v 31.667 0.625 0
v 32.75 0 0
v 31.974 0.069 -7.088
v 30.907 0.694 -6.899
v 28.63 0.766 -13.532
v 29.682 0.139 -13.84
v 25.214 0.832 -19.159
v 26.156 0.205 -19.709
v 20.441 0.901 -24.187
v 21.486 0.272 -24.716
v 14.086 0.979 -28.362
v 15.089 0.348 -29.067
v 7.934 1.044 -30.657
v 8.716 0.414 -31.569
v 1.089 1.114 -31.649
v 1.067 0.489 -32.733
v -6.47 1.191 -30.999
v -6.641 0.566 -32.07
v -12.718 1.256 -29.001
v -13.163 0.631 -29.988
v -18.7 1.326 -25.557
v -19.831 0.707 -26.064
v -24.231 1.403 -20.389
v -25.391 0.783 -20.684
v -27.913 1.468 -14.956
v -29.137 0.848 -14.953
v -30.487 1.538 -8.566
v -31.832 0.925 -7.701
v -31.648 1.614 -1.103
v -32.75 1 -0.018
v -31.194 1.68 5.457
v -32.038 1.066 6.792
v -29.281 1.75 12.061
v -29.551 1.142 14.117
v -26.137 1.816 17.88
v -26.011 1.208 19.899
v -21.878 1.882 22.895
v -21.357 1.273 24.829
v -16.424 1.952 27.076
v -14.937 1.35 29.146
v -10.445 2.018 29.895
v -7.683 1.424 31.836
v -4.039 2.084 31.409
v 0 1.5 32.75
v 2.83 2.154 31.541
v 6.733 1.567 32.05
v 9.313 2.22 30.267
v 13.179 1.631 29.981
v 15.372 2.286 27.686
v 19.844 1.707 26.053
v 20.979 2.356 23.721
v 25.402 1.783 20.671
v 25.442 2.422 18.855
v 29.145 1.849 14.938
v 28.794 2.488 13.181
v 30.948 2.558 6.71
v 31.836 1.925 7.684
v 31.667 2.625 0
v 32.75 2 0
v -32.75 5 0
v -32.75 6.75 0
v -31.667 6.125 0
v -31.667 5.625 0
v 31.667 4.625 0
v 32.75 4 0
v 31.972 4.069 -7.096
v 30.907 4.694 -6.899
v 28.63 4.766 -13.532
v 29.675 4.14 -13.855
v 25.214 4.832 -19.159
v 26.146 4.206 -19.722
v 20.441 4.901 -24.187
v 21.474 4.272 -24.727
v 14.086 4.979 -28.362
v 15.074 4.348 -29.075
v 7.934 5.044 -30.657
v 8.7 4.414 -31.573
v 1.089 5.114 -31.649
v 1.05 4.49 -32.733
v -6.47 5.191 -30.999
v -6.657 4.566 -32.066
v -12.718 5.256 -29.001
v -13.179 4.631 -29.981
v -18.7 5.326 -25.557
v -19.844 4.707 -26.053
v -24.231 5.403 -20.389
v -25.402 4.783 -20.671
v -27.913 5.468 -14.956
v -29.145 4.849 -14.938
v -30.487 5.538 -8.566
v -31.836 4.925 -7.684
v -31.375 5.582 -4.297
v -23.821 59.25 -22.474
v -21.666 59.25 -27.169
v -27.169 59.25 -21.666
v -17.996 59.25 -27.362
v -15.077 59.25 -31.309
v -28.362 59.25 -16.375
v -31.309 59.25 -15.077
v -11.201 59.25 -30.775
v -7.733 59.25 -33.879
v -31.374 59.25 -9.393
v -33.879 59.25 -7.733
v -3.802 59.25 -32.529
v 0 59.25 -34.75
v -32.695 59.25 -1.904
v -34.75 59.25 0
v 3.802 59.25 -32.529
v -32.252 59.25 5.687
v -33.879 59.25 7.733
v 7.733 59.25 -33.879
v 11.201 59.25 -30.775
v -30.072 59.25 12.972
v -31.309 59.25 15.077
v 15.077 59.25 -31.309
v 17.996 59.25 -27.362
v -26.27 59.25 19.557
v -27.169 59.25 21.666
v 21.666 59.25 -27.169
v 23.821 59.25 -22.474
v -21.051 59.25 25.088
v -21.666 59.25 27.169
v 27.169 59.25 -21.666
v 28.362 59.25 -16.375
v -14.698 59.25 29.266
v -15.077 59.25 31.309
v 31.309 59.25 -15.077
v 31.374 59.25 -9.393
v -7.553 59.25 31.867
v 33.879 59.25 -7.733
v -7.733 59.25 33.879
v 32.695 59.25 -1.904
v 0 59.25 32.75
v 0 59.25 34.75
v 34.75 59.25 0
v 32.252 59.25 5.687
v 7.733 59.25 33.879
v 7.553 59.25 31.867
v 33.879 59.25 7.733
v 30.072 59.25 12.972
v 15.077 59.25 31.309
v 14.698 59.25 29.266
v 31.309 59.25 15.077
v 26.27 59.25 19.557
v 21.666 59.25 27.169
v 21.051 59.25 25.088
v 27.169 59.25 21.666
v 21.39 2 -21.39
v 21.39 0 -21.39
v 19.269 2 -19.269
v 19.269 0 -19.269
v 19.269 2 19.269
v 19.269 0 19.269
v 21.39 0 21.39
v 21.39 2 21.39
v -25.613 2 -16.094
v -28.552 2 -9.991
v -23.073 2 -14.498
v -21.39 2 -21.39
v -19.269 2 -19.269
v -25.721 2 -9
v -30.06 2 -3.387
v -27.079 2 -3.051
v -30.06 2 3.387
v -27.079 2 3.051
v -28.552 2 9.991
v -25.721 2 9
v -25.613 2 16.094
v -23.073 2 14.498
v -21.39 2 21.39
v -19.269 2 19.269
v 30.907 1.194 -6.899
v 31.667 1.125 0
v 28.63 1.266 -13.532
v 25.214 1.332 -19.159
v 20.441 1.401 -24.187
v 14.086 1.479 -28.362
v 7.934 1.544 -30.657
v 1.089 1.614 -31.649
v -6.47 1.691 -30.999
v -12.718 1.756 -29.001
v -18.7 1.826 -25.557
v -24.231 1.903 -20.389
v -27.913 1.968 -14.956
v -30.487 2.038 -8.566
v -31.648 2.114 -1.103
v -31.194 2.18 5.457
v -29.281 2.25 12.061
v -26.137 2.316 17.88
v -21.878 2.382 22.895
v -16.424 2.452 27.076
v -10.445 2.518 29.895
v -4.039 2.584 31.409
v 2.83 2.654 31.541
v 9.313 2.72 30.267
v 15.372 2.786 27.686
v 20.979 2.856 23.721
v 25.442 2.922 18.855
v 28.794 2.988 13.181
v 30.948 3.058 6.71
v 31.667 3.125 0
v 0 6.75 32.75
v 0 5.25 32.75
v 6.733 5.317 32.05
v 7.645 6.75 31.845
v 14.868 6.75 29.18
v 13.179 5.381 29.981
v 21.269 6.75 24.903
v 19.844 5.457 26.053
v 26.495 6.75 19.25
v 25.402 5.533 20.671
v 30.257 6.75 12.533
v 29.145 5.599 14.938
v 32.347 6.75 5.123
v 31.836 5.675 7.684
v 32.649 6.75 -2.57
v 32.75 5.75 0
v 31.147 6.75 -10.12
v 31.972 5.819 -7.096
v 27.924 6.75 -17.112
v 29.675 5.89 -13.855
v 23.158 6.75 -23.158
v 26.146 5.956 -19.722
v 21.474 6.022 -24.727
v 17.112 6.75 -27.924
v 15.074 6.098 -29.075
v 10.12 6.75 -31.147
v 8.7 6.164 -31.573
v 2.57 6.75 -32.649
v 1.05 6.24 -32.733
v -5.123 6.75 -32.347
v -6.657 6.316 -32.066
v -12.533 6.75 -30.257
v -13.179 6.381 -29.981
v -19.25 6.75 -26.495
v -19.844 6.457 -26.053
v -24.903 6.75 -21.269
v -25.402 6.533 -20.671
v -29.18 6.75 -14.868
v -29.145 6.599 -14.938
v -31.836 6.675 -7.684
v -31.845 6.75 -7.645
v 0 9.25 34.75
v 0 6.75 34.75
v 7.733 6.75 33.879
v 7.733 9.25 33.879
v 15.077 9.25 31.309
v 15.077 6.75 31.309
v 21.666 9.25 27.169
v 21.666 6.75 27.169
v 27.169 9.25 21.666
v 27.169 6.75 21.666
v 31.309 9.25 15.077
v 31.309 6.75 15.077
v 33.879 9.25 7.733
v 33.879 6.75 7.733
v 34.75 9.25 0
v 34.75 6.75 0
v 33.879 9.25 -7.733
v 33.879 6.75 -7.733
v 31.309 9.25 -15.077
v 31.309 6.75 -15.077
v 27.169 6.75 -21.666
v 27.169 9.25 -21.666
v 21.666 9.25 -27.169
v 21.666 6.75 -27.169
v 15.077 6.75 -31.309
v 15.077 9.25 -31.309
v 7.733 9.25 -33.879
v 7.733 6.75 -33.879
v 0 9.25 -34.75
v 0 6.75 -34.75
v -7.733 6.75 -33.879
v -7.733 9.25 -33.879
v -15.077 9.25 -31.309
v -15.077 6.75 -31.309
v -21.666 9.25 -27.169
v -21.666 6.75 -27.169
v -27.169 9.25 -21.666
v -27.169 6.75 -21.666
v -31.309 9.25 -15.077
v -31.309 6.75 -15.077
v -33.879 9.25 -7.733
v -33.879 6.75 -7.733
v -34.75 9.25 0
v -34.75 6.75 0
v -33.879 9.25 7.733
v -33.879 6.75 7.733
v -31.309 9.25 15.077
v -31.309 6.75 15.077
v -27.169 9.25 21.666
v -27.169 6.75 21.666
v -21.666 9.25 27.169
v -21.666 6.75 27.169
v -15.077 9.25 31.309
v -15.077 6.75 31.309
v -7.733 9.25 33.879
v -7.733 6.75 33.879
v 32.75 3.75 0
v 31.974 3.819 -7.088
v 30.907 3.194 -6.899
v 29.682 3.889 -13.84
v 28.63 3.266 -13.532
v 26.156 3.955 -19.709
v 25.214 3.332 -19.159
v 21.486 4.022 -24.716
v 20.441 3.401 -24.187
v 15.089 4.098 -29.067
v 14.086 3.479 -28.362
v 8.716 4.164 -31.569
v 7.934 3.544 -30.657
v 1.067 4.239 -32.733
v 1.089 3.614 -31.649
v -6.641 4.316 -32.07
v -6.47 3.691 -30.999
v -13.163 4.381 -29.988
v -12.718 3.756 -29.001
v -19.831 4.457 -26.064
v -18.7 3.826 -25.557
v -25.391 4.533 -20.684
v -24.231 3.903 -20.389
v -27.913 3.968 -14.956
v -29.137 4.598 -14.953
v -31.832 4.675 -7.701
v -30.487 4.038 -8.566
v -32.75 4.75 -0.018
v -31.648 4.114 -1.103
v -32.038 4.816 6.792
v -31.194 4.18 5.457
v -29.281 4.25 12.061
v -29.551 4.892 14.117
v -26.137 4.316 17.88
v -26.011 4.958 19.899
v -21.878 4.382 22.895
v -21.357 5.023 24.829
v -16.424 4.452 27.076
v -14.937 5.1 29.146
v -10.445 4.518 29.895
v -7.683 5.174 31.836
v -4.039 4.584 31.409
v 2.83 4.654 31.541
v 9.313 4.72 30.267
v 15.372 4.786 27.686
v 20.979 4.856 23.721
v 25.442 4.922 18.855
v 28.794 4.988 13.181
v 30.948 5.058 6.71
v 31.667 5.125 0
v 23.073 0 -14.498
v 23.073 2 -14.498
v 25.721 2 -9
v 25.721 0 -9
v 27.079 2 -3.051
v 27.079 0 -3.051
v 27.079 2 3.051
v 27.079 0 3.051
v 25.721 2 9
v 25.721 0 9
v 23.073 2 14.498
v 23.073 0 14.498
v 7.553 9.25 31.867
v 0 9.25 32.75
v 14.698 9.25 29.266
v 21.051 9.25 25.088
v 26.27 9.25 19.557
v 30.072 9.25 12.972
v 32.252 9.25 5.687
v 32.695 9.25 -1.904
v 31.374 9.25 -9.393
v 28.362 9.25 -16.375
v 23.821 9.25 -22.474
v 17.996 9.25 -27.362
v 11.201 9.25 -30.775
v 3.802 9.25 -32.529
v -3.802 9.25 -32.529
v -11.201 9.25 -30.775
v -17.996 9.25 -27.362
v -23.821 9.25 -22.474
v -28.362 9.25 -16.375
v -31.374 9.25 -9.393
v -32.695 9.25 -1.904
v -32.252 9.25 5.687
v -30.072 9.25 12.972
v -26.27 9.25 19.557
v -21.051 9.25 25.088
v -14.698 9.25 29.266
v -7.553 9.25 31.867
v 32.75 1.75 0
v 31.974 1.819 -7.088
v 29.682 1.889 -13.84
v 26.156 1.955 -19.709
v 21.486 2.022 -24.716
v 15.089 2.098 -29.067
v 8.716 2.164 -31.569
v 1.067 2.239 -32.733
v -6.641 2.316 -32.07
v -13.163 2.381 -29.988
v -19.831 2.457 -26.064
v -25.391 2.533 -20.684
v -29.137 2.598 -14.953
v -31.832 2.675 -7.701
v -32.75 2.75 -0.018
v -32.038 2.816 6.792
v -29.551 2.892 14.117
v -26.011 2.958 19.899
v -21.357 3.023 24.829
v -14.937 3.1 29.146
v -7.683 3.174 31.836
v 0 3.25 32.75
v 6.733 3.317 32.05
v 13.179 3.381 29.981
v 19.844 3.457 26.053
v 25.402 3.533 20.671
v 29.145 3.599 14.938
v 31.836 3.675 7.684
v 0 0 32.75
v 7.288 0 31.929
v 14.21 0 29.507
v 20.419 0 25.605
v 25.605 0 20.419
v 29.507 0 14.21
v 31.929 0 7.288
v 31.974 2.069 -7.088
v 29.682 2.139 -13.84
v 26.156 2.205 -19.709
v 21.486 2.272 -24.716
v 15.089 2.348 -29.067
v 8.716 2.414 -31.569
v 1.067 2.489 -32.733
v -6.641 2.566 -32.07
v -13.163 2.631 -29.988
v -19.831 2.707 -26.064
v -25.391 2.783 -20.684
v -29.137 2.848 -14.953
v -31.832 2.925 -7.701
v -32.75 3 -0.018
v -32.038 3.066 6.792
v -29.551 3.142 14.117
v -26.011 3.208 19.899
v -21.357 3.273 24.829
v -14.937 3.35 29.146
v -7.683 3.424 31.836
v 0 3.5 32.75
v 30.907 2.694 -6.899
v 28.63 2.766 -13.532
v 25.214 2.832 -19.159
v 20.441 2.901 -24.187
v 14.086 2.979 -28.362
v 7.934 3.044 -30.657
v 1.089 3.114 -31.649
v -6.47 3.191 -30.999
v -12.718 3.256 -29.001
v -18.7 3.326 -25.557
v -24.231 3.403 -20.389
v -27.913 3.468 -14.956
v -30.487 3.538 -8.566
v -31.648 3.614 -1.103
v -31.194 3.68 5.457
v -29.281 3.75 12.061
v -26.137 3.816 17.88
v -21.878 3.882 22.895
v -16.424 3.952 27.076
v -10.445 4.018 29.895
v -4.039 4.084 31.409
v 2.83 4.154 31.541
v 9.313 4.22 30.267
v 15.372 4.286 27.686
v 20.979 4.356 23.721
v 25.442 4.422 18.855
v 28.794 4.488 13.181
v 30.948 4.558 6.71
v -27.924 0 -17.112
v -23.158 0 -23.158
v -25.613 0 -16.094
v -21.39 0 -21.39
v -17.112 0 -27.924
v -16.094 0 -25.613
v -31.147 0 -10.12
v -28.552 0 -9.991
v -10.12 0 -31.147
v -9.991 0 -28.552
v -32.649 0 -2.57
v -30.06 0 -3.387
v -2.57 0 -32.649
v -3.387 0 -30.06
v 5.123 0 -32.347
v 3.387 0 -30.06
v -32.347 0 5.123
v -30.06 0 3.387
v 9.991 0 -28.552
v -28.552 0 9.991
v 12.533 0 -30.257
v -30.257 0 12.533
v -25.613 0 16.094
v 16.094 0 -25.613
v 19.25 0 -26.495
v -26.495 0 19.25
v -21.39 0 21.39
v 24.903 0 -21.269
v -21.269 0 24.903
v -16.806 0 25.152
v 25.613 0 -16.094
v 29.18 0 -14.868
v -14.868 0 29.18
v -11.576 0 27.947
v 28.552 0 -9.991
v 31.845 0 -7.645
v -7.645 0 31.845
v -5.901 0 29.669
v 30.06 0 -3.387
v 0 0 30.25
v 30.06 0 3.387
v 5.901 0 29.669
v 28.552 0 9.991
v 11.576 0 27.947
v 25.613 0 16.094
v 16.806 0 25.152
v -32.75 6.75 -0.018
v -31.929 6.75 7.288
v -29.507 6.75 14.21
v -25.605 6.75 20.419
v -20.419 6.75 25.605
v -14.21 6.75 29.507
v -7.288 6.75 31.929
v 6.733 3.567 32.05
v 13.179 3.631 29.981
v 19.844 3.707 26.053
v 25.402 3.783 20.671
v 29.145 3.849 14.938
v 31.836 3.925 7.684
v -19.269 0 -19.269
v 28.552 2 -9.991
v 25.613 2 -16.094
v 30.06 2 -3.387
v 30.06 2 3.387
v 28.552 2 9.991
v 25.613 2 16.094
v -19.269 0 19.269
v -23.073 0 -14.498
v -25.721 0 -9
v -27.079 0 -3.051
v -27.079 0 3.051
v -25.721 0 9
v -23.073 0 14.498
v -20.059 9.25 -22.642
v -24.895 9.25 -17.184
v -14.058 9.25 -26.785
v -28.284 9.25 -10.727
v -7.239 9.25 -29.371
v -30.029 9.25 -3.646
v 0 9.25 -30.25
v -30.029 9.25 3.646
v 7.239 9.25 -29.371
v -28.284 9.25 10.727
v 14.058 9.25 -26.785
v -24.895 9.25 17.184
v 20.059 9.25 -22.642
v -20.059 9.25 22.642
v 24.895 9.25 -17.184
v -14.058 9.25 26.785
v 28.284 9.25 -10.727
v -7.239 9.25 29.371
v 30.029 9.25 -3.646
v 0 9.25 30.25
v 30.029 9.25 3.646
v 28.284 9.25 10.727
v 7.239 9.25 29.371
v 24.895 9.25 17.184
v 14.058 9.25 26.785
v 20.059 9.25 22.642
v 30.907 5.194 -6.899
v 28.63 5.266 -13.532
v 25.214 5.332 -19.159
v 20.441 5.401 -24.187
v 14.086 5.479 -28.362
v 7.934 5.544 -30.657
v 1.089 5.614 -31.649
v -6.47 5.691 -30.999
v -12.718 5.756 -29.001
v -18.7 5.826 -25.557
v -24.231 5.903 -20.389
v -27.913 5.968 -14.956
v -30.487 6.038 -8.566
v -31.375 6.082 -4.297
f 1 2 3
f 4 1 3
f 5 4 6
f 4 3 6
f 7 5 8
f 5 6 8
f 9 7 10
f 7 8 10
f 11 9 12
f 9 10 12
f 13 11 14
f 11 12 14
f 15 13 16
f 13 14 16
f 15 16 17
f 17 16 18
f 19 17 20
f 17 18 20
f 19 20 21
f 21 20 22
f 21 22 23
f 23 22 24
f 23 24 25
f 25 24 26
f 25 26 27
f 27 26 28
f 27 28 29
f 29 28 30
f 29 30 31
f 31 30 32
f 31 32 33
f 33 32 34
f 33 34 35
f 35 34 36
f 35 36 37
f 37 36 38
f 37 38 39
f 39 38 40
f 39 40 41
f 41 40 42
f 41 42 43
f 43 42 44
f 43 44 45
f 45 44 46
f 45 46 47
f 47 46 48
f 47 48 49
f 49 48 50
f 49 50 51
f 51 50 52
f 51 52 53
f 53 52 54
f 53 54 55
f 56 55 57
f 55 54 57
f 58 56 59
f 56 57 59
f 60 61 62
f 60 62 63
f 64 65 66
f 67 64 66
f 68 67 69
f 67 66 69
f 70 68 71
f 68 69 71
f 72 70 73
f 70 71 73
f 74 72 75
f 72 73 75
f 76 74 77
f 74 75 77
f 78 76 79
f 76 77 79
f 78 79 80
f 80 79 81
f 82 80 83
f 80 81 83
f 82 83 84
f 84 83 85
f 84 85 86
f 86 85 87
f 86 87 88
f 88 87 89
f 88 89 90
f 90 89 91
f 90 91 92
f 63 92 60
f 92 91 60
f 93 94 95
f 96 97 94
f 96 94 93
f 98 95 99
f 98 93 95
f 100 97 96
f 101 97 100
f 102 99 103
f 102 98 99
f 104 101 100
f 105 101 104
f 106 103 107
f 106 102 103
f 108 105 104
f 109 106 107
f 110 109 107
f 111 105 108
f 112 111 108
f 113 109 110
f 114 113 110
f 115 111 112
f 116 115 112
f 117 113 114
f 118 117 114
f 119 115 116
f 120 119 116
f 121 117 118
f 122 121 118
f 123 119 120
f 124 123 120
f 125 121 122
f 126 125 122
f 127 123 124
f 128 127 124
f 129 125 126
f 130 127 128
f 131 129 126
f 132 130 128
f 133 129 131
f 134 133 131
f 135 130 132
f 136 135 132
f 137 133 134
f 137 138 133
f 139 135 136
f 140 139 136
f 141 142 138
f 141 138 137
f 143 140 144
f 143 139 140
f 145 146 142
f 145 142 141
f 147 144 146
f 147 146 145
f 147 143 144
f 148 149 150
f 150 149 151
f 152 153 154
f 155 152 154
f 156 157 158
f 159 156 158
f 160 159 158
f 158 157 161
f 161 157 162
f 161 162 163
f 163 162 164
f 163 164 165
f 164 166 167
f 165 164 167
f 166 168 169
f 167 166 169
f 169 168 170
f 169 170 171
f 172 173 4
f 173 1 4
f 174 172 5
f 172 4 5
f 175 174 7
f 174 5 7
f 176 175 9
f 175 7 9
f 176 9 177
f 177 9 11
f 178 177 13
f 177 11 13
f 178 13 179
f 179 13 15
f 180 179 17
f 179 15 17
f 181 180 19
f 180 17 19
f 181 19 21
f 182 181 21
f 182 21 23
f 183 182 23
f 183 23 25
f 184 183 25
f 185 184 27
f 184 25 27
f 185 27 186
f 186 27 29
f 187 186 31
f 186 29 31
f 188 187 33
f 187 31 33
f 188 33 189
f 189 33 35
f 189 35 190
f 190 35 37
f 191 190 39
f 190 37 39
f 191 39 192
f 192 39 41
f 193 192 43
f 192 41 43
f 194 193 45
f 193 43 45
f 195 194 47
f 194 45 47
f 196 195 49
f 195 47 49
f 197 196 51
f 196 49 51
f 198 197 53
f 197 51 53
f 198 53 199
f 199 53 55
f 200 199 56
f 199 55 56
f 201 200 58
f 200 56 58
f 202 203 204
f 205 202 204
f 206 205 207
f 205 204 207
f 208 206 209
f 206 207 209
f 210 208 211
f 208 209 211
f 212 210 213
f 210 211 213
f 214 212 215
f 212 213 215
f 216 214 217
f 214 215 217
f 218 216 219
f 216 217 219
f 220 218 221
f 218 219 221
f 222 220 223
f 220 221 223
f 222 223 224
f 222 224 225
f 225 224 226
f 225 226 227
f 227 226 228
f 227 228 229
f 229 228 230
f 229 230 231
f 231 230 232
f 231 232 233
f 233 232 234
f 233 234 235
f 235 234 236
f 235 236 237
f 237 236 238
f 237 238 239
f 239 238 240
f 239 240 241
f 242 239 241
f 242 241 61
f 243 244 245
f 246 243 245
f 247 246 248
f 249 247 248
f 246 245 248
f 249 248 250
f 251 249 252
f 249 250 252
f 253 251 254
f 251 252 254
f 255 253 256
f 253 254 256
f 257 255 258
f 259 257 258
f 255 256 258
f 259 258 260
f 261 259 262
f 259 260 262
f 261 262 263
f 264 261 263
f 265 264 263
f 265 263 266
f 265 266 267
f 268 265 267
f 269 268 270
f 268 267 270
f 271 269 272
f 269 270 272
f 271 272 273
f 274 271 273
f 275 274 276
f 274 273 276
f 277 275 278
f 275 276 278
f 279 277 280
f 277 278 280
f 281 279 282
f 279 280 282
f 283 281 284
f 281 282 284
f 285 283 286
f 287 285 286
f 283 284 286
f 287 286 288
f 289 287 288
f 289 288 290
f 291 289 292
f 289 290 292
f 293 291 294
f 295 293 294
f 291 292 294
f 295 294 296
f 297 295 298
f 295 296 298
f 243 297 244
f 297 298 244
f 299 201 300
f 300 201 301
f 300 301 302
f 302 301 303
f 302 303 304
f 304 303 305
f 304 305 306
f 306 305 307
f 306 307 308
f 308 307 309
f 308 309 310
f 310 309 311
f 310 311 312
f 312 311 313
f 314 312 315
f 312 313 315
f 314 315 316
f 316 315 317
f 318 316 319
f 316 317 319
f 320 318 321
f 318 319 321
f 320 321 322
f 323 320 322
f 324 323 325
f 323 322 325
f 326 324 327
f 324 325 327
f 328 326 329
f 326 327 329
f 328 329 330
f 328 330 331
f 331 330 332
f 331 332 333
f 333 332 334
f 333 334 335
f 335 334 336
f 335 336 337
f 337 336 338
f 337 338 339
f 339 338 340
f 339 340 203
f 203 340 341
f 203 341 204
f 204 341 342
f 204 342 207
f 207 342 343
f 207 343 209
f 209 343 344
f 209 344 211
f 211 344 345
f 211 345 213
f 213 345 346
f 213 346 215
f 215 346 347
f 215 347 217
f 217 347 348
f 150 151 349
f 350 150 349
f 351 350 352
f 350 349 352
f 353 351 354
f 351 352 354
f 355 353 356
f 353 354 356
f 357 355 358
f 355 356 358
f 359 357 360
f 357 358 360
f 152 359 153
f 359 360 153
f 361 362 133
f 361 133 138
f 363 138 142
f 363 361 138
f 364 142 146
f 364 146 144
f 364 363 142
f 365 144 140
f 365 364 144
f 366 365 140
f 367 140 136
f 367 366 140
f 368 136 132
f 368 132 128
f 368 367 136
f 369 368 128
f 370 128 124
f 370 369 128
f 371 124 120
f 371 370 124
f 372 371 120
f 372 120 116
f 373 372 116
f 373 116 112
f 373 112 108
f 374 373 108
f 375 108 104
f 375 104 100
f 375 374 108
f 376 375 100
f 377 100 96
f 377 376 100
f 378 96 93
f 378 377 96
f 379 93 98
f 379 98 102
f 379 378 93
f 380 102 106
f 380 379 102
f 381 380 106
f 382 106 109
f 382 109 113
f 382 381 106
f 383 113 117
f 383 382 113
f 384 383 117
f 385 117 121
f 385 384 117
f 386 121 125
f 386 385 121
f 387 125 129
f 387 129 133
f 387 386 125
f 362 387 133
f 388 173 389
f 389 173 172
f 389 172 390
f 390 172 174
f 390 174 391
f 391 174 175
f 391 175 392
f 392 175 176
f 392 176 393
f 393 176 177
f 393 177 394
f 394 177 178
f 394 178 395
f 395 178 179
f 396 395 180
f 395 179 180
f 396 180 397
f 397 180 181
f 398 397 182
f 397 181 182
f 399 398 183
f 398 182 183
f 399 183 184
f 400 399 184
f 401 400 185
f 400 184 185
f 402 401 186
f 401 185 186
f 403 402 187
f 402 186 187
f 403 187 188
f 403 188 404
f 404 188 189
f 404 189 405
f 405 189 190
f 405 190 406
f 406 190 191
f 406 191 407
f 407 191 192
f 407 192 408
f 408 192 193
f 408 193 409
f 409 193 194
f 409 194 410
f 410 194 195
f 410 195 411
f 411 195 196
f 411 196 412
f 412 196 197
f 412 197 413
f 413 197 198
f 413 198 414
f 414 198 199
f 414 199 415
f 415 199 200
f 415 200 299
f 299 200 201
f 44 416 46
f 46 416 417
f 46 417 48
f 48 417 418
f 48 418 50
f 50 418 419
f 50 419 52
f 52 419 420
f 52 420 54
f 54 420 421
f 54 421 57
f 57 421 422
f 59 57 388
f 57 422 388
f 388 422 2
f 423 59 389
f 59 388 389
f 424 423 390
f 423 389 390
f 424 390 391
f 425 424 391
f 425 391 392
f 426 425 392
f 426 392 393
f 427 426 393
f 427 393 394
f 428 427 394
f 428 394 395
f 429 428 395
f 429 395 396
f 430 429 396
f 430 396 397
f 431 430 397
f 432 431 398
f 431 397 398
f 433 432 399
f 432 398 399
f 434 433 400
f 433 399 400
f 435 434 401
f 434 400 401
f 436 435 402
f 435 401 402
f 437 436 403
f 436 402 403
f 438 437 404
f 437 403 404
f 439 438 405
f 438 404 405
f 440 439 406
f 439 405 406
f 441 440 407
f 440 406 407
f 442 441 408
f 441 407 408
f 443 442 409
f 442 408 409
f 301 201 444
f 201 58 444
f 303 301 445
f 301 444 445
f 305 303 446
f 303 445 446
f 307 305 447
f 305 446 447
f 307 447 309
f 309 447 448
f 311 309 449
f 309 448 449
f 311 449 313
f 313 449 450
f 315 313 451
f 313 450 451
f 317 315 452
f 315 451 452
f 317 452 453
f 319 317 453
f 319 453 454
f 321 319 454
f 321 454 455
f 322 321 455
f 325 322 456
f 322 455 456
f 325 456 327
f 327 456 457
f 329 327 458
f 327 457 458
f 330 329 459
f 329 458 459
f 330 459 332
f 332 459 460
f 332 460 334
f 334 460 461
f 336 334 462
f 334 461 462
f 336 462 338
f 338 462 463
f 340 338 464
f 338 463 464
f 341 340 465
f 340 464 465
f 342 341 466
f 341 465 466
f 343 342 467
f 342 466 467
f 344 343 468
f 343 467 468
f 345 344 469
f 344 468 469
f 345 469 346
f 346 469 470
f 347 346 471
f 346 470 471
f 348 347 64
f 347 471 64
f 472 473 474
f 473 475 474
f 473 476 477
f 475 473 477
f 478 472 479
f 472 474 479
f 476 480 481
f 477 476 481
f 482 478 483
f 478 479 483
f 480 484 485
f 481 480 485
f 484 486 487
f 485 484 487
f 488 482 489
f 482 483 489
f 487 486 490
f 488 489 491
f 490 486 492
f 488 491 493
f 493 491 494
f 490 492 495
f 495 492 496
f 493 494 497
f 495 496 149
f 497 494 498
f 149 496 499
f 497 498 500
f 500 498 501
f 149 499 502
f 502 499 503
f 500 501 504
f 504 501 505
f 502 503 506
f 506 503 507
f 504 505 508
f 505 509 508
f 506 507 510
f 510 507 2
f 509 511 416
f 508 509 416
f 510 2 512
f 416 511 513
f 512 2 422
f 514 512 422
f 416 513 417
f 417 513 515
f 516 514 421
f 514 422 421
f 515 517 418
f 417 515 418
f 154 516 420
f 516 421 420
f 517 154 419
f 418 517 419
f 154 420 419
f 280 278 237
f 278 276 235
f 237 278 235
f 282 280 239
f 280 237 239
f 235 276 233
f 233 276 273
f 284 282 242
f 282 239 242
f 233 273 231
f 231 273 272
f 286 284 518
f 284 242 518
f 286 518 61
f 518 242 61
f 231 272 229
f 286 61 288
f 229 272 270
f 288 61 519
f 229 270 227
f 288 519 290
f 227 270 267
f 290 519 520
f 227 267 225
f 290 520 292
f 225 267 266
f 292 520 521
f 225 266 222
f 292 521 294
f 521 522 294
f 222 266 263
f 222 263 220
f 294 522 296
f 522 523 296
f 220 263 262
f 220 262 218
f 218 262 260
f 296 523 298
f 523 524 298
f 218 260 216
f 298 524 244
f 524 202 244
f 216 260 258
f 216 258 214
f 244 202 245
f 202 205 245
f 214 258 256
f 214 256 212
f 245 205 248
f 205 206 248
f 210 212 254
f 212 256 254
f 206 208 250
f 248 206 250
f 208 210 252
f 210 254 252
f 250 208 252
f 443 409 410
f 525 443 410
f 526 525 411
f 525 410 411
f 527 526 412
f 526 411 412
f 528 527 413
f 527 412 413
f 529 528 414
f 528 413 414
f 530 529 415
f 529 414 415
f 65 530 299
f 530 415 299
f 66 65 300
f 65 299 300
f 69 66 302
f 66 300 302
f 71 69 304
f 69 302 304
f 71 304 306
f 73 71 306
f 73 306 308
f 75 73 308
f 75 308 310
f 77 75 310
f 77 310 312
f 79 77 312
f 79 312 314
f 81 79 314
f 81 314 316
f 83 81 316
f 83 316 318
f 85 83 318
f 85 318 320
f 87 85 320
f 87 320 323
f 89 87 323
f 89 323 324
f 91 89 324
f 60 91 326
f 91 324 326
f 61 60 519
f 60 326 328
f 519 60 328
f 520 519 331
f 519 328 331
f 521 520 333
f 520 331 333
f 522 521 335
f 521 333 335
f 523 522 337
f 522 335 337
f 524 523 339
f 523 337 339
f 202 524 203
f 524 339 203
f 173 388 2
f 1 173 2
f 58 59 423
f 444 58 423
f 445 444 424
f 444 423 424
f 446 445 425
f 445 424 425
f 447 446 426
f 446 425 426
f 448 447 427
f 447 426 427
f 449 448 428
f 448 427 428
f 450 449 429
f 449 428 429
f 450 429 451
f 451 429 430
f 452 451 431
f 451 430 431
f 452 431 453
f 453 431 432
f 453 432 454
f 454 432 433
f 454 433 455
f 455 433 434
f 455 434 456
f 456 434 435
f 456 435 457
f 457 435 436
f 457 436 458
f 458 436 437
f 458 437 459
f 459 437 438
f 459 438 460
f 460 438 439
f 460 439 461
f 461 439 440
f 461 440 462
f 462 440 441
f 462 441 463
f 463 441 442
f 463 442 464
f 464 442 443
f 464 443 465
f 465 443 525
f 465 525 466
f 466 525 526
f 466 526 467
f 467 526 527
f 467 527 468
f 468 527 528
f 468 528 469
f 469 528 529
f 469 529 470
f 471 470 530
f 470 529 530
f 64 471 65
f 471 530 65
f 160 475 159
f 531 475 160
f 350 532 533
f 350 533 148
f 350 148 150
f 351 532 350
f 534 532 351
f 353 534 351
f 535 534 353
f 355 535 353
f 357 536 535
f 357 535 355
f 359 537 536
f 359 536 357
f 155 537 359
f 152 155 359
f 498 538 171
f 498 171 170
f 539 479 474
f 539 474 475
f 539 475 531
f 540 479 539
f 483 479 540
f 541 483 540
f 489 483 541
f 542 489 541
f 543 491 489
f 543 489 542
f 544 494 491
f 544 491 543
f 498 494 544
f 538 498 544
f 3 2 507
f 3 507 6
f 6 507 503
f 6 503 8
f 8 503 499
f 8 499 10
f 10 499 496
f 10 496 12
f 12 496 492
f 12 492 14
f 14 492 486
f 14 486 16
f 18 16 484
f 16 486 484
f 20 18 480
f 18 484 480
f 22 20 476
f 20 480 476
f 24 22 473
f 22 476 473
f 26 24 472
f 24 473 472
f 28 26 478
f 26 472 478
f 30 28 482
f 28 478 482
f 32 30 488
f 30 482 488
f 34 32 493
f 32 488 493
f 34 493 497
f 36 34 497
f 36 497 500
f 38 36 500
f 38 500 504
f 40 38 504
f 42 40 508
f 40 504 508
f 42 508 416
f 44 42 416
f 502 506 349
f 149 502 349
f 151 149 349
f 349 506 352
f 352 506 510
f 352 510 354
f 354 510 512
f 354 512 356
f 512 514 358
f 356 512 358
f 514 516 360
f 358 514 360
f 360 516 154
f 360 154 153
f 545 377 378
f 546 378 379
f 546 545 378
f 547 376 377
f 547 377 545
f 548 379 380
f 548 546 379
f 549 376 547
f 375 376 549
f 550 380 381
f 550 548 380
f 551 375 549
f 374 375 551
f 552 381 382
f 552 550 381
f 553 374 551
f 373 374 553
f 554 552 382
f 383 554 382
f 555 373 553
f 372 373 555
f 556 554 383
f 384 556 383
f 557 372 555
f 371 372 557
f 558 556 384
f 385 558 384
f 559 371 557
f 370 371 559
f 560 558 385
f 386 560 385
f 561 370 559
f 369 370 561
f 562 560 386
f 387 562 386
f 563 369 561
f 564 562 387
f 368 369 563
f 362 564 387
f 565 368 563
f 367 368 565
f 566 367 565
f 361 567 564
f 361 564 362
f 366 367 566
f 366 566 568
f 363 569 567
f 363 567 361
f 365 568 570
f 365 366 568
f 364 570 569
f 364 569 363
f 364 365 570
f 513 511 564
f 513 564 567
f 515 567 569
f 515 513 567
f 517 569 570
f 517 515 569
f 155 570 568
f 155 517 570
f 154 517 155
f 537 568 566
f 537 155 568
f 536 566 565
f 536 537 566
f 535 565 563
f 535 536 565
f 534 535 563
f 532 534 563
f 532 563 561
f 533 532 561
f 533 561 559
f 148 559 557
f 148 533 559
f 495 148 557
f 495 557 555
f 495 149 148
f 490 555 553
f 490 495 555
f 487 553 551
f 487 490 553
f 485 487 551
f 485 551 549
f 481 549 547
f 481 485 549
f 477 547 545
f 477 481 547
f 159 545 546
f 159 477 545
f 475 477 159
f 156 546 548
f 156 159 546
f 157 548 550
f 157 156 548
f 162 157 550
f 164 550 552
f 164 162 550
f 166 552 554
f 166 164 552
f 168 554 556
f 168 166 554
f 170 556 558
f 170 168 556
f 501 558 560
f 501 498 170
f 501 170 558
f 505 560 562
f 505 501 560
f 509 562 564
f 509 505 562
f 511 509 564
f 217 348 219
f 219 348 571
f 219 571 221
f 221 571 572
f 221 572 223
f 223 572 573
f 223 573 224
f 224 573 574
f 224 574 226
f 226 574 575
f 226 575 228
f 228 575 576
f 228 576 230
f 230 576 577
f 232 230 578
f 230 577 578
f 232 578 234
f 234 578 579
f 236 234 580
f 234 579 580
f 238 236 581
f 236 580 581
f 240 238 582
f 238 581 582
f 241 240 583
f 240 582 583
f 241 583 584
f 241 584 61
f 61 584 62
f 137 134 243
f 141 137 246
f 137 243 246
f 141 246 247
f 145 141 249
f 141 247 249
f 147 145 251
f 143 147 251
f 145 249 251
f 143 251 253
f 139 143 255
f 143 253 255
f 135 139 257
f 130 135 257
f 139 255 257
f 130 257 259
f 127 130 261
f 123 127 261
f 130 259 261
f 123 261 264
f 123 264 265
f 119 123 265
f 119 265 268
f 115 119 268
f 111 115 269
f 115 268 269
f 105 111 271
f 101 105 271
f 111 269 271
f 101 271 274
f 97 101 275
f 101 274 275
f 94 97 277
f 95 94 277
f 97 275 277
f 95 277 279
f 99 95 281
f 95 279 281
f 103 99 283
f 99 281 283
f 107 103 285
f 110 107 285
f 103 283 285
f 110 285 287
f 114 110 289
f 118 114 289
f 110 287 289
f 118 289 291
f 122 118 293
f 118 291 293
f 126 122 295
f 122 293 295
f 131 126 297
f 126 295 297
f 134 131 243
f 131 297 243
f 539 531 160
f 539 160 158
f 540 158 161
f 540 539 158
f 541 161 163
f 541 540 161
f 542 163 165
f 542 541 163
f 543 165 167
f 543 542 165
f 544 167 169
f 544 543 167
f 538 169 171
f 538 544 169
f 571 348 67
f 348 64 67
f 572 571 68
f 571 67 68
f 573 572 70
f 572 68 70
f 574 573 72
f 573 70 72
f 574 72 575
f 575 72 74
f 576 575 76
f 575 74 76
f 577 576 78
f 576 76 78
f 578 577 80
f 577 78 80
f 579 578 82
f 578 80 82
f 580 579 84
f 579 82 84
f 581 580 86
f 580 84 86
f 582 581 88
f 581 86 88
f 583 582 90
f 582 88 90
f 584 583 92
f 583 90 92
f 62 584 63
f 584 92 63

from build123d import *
from build123d.topology import SkipClean

# Parameters (mm, degrees)
SKETCH1_R           = 32.75
SKETCH1_R_2         = 30.25
BOSS_EXTRUDE1_DEPTH = 6.75
SKETCH2_R           = 34.75
SKETCH2_R_2         = 30.25
BOSS_EXTRUDE2_DEPTH = 2.5
THREAD1_PITCH       = 2
BOSS_EXTRUDE3_DEPTH = 2
SKETCH5_R           = 34.75
SKETCH5_R_2         = 32.75
BOSS_EXTRUDE4_DEPTH = 50


with BuildPart() as part:
    # Sketch1 → Boss-Extrude1 (new body)
    with BuildSketch(Plane(origin=(0, 0, 0), x_dir=(1, 0, 0), z_dir=(0, 1, 0))):
        with Locations(Location((0, 0, 0), (0, 0, 270))):
            Circle(SKETCH1_R)
        with Locations(Location((0, 0, 0), (0, 0, 270))):
            Circle(SKETCH1_R_2, mode=Mode.SUBTRACT)
    extrude(amount=BOSS_EXTRUDE1_DEPTH)

    # Sketch2 → Boss-Extrude2 (add)
    with BuildSketch(Plane(origin=(0, 6.75, 0), x_dir=(1, 0, 0), z_dir=(0, 1, 0))):
        with Locations(Location((0, 0, 0), (0, 0, 270))):
            Circle(SKETCH2_R)
        with Locations(Location((0, 0, 0), (0, 0, 270))):
            Circle(SKETCH2_R_2, mode=Mode.SUBTRACT)
    extrude(amount=BOSS_EXTRUDE2_DEPTH)

    # Thread1: the profile of Thread Profile1 profile screwed along a right-hand helix of 2.5 turns, 10 arcs to a turn; built about Z, then put on its axis
    with SkipClean():  # the faces are left unmerged after this step: merging them gives an invalid solid
        thread1_z = Axis((0, 0, 0), (0, 0, 1))
        thread1_corners = [(32.7503, 0, -0.000173205), (32.7503, 0, 1.7501732), (31.66746825, 0, 1.124999997), (31.66746825, 0, 0.624999997)]
        with BuildLine(mode=Mode.PRIVATE) as thread1_profile:
            Line(thread1_corners[0], thread1_corners[1])
            Line(thread1_corners[1], thread1_corners[2])
            Line(thread1_corners[2], thread1_corners[3])
            Line(thread1_corners[3], thread1_corners[0])
        thread1_cap = Face(thread1_profile.wire())
        thread1_turn_angles = [0, 18, 36, 54, 72, 90, 108, 126, 144, 162, 180, 198, 216, 234, 252, 270, 288, 306, 324, 342, 360]
        thread1_turn_weights = [1, 0.9510565162951535, 1, 0.9510565162951535, 1, 0.9510565162951535, 1, 0.9510565162951535, 1, 0.9510565162951535, 1, 0.9510565162951535, 1, 0.9510565162951535, 1, 0.9510565162951535, 1, 0.9510565162951535, 1, 0.9510565162951535, 1]
        thread1_turn_rails = [Edge.make_bspline([Vector(p[0], p[1], 0).rotate(thread1_z, thread1_turn_angles[k]) / thread1_turn_weights[k] + Vector(0, 0, p[2] + THREAD1_PITCH * thread1_turn_angles[k] / 360) for k in range(21)], [0, 0, 0, 1, 1, 2, 2, 3, 3, 4, 4, 5, 5, 6, 6, 7, 7, 8, 8, 9, 9, 10, 10, 10], 2, thread1_turn_weights) for p in thread1_corners]
        thread1_turn_sides = [Face.make_surface_from_curves(thread1_turn_rails[p[0]], thread1_turn_rails[p[1]]) for p in [(0, 1), (1, 2), (2, 3), (3, 0)]]
        thread1_last_angles = [720, 738, 756, 774, 792, 810, 828, 846, 864, 882, 900]
        thread1_last_weights = [1, 0.9510565162951535, 1, 0.9510565162951535, 1, 0.9510565162951535, 1, 0.9510565162951535, 1, 0.9510565162951535, 1]
        thread1_last_rails = [Edge.make_bspline([Vector(p[0], p[1], 0).rotate(thread1_z, thread1_last_angles[k]) / thread1_last_weights[k] + Vector(0, 0, p[2] + THREAD1_PITCH * thread1_last_angles[k] / 360) for k in range(11)], [0, 0, 0, 1, 1, 2, 2, 3, 3, 4, 4, 5, 5, 5], 2, thread1_last_weights) for p in thread1_corners]
        thread1_last_sides = [Face.make_surface_from_curves(thread1_last_rails[p[0]], thread1_last_rails[p[1]]) for p in [(0, 1), (1, 2), (2, 3), (3, 0)]]
        thread1 = Plane(origin=(0, 0, 0), x_dir=(1, 0, 0), z_dir=(0, 1, 0)) * Solid(Shell([*[p.moved(Location((0, 0, THREAD1_PITCH * i))) for i in range(2) for p in thread1_turn_sides], *thread1_last_sides, thread1_cap, thread1_cap.rotate(thread1_z, 900).moved(Location((0, 0, THREAD1_PITCH * 900 / 360)))]))
        add(thread1, mode=Mode.SUBTRACT)

    # Sketch3 → Boss-Extrude3 (add)
    with SkipClean():  # the faces are left unmerged after this step: merging them gives an invalid solid
        with BuildSketch(Plane.XZ):
            with BuildLine():
                Line((19.268659787, 19.268659787), (21.389980131, 21.389980131))
                ThreePointArc((21.389980131, 21.389980131), (30.25, 0), (21.389980131, -21.389980131))
                Line((21.389980131, -21.389980131), (19.268659787, -19.268659787))
                ThreePointArc((19.268659787, -19.268659787), (27.25, 0), (19.268659787, 19.268659787))
            make_face()
            with BuildLine():
                Line((-19.268659787, 19.268659787), (-21.389980131, 21.389980131))
                ThreePointArc((-21.389980131, 21.389980131), (-30.25, 0), (-21.389980131, -21.389980131))
                Line((-21.389980131, -21.389980131), (-19.268659787, -19.268659787))
                ThreePointArc((-19.268659787, -19.268659787), (-27.25, 0), (-19.268659787, 19.268659787))
            make_face()
        extrude(amount=-BOSS_EXTRUDE3_DEPTH)

    # Sketch5 → Boss-Extrude4 (add)
    with SkipClean():  # the faces are left unmerged after this step: merging them gives an invalid solid
        with BuildSketch(Plane(origin=(0, 9.25, 0), x_dir=(1, 0, 0), z_dir=(0, 1, 0))):
            with Locations(Location((0, 0, 0), (0, 0, 270))):
                Circle(SKETCH5_R)
            with Locations(Location((0, 0, 0), (0, 0, 270))):
                Circle(SKETCH5_R_2, mode=Mode.SUBTRACT)
        extrude(amount=BOSS_EXTRUDE4_DEPTH)


solid = part.part
